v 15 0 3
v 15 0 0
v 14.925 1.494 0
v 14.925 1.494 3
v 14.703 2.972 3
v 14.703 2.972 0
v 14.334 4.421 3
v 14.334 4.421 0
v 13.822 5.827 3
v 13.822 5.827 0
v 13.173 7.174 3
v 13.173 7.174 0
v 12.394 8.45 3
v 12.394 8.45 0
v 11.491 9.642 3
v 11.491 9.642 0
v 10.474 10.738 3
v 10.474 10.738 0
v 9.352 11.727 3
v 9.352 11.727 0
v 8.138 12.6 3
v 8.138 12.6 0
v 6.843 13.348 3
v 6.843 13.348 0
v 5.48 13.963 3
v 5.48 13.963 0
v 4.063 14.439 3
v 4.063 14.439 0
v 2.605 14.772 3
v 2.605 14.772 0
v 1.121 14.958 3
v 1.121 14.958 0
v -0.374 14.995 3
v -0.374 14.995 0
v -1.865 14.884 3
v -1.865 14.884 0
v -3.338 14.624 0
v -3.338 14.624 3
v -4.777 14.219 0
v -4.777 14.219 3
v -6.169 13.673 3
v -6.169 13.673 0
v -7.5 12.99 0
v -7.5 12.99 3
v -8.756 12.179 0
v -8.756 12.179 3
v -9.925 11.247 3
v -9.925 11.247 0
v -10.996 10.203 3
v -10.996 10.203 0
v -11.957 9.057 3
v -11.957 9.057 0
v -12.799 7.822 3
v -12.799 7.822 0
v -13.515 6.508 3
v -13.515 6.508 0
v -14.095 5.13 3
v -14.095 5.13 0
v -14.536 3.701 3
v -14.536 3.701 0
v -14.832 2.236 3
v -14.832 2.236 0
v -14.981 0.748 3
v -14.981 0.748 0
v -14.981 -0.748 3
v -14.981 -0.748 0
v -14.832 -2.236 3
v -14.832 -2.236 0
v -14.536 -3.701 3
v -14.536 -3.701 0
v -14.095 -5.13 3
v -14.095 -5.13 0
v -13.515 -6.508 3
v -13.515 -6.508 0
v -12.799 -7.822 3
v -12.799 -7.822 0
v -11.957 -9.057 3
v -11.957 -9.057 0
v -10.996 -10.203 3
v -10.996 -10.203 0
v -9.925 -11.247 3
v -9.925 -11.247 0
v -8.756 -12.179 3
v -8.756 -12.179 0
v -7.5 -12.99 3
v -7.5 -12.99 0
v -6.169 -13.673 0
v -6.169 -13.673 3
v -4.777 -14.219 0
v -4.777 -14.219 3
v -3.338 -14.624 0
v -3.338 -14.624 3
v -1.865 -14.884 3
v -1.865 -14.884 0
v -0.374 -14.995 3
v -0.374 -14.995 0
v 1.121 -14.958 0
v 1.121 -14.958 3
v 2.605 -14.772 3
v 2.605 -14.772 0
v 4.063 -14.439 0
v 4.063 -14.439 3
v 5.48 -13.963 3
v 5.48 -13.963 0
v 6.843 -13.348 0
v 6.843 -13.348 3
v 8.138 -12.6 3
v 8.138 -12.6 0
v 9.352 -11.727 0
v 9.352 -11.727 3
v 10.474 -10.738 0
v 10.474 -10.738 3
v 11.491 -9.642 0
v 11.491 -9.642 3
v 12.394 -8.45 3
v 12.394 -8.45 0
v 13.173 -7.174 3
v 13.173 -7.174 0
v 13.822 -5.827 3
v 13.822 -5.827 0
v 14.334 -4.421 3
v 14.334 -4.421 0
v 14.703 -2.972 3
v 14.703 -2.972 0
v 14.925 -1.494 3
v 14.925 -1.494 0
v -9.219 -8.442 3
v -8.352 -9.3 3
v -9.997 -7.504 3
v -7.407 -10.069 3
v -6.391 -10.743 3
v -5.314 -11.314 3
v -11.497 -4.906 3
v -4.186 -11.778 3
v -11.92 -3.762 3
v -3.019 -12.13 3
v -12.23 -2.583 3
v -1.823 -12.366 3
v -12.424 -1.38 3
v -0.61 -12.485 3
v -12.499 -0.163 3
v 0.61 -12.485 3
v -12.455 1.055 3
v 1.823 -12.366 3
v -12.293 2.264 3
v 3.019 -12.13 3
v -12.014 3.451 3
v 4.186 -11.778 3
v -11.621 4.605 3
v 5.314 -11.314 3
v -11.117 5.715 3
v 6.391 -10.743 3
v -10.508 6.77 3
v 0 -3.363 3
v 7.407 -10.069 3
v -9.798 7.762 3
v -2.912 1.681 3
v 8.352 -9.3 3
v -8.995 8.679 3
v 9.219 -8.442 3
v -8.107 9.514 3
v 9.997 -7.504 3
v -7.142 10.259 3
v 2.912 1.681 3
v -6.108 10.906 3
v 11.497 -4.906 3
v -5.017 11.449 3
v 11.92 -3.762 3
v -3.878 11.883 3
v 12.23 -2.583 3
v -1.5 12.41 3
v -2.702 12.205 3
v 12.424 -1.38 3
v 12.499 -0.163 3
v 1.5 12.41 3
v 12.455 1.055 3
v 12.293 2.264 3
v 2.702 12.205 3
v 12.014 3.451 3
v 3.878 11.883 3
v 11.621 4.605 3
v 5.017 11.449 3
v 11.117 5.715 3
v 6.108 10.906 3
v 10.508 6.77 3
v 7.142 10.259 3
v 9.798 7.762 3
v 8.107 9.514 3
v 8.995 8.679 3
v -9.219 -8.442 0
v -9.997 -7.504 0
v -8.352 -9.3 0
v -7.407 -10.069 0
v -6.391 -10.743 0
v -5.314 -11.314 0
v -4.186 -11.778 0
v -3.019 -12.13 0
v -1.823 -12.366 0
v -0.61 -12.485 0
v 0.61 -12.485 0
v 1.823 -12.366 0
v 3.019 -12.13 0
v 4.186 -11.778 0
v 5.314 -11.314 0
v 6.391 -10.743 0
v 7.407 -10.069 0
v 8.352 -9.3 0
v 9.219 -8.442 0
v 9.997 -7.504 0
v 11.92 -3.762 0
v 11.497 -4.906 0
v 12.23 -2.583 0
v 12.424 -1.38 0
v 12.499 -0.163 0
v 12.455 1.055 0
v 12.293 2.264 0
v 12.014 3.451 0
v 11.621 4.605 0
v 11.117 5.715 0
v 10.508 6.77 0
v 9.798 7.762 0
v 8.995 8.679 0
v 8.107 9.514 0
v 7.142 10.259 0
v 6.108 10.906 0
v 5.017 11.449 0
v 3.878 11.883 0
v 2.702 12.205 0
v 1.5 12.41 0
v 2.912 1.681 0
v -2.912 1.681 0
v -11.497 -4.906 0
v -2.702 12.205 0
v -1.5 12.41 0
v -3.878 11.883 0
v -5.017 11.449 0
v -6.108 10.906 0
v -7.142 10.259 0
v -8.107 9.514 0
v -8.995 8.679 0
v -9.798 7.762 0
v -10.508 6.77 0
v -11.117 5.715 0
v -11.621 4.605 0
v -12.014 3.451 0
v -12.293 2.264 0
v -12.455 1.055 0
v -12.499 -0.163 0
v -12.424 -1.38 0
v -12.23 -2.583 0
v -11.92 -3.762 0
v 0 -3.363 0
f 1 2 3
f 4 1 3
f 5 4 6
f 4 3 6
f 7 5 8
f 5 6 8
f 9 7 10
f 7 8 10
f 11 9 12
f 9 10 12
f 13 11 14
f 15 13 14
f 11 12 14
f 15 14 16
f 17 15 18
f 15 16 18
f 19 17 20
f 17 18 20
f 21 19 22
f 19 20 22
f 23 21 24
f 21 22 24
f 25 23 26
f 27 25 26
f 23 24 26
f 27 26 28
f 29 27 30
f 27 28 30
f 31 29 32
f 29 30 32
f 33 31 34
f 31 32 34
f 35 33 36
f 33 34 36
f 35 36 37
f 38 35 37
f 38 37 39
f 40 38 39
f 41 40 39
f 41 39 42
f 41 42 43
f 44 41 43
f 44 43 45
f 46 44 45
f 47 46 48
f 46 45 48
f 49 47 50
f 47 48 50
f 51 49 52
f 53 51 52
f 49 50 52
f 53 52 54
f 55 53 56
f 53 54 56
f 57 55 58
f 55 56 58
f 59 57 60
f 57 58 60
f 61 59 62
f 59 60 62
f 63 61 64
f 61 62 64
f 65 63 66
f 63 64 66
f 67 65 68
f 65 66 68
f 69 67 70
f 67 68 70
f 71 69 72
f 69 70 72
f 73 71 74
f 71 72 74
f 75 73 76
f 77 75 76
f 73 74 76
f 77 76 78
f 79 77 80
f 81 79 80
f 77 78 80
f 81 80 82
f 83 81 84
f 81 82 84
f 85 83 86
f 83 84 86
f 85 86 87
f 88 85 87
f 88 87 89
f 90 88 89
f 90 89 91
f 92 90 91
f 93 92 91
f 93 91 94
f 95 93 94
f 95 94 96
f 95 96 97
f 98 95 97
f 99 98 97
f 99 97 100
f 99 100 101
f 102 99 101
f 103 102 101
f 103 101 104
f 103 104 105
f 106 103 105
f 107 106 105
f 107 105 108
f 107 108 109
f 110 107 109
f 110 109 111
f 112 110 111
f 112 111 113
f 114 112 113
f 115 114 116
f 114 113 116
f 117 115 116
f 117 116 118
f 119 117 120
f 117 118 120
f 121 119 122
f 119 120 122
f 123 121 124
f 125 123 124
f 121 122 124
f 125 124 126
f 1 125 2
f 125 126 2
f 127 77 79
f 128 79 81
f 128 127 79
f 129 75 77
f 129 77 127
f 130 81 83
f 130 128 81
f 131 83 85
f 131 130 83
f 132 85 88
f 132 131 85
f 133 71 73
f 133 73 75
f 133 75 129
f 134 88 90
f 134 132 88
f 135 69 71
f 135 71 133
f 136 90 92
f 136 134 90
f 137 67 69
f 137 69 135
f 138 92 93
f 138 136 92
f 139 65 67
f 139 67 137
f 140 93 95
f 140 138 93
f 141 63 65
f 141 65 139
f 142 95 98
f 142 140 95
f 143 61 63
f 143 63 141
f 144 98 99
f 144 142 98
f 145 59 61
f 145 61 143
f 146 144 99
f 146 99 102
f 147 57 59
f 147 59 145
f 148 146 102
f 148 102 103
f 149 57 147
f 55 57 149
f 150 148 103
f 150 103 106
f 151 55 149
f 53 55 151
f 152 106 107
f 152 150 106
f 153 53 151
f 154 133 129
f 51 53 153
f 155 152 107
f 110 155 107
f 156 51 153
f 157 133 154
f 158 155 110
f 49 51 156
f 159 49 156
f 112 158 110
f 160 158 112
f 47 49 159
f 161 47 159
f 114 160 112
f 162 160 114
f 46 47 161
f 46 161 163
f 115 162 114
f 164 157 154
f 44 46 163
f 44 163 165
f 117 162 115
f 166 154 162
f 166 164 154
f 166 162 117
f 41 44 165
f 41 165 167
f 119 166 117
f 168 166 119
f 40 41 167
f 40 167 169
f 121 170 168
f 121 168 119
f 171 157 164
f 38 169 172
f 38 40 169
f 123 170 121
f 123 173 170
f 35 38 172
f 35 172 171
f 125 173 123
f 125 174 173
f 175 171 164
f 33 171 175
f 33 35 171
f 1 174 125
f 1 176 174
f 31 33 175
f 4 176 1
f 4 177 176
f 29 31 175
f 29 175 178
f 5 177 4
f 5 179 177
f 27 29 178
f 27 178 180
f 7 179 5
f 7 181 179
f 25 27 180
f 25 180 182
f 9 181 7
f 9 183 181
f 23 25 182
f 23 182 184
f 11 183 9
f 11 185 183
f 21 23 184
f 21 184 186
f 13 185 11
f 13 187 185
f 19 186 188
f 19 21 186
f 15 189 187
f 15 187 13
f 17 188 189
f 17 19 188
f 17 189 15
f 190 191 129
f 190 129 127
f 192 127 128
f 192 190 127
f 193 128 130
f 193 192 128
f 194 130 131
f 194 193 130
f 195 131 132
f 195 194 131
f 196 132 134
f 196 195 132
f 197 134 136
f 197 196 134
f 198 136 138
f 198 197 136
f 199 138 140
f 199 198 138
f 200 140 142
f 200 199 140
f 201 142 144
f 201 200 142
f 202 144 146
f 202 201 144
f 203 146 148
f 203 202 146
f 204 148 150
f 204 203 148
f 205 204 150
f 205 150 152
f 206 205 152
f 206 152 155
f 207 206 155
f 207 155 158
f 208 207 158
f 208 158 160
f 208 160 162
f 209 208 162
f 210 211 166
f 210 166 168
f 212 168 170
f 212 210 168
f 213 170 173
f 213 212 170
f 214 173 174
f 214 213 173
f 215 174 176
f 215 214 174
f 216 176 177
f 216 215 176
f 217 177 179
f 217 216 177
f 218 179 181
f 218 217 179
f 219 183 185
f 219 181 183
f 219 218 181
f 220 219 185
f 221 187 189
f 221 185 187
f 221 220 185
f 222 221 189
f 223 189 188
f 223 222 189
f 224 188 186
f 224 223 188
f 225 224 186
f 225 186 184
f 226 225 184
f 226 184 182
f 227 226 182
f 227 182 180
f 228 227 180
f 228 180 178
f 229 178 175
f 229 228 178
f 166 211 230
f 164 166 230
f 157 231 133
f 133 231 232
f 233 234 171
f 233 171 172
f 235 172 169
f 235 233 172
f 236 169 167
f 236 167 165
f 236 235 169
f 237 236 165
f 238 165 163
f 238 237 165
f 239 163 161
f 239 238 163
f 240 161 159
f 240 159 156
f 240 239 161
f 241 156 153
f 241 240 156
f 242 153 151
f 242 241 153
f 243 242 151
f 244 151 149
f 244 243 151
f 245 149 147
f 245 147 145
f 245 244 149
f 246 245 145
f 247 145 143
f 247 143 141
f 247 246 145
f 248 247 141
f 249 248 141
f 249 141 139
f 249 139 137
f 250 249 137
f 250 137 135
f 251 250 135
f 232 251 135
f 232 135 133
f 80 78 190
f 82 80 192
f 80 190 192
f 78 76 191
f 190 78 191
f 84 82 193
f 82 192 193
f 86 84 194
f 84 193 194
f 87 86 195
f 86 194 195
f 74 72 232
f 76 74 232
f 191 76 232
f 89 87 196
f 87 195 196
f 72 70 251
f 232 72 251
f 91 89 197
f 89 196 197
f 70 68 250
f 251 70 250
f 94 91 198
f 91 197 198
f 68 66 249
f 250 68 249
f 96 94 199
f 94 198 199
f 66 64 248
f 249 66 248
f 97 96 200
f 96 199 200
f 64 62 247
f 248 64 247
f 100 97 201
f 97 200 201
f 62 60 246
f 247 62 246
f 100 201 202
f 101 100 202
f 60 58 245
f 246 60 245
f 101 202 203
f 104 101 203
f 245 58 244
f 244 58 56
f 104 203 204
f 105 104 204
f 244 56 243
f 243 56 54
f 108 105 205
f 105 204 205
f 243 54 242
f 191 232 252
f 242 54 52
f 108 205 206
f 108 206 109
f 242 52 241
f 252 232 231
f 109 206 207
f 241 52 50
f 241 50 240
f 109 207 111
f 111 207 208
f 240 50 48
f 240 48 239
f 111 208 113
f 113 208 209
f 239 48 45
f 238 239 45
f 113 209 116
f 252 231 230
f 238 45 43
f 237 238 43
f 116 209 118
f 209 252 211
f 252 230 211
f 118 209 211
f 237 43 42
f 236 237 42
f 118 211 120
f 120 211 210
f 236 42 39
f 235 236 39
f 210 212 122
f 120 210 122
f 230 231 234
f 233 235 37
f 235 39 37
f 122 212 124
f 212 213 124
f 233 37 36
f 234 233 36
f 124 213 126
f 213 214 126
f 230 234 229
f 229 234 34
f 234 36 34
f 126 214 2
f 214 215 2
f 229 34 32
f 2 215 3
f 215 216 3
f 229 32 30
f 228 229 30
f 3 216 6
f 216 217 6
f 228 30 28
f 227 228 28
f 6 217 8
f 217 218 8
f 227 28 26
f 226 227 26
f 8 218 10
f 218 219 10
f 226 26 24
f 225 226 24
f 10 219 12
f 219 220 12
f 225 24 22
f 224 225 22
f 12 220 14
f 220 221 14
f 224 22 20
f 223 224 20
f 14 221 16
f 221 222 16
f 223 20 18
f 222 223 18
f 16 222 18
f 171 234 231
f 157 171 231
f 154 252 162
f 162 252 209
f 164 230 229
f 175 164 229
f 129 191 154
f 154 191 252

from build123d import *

# Parameters (mm, degrees)
SKETCH_1_R      = 15
SKETCH_1_R_2    = 12.5
EXTRUDE_1_DEPTH = 3


with BuildPart() as part:
    # 草图1 → 凸台-拉伸1 (new body)
    # profile 1 of 2: a face of its own
    with BuildSketch(Plane.XY):
        Circle(SKETCH_1_R)
        Circle(SKETCH_1_R_2, mode=Mode.SUBTRACT)
    # profile 2 of 2: a face of its own
    with BuildSketch(Plane.XY):
        with BuildLine():
            ThreePointArc((1.5, 12.409673646), (0, 12.5), (-1.5, 12.409673646))
            Line((-1.5, 12.409673646), (-2.912394569, 1.681471788))
            Line((-2.912394569, 1.681471788), (-11.49709263, -4.905798717))
            ThreePointArc((-11.49709263, -4.905798717), (-10.825317547, -6.25), (-9.99709263, -7.503874929))
            Line((-9.99709263, -7.503874929), (0, -3.362943577))
            Line((0, -3.362943577), (9.99709263, -7.503874929))
            ThreePointArc((9.99709263, -7.503874929), (10.825317547, -6.25), (11.49709263, -4.905798717))
            Line((11.49709263, -4.905798717), (2.912394569, 1.681471788))
            Line((2.912394569, 1.681471788), (1.5, 12.409673646))
        make_face()
    extrude(amount=EXTRUDE_1_DEPTH)


solid = part.part
